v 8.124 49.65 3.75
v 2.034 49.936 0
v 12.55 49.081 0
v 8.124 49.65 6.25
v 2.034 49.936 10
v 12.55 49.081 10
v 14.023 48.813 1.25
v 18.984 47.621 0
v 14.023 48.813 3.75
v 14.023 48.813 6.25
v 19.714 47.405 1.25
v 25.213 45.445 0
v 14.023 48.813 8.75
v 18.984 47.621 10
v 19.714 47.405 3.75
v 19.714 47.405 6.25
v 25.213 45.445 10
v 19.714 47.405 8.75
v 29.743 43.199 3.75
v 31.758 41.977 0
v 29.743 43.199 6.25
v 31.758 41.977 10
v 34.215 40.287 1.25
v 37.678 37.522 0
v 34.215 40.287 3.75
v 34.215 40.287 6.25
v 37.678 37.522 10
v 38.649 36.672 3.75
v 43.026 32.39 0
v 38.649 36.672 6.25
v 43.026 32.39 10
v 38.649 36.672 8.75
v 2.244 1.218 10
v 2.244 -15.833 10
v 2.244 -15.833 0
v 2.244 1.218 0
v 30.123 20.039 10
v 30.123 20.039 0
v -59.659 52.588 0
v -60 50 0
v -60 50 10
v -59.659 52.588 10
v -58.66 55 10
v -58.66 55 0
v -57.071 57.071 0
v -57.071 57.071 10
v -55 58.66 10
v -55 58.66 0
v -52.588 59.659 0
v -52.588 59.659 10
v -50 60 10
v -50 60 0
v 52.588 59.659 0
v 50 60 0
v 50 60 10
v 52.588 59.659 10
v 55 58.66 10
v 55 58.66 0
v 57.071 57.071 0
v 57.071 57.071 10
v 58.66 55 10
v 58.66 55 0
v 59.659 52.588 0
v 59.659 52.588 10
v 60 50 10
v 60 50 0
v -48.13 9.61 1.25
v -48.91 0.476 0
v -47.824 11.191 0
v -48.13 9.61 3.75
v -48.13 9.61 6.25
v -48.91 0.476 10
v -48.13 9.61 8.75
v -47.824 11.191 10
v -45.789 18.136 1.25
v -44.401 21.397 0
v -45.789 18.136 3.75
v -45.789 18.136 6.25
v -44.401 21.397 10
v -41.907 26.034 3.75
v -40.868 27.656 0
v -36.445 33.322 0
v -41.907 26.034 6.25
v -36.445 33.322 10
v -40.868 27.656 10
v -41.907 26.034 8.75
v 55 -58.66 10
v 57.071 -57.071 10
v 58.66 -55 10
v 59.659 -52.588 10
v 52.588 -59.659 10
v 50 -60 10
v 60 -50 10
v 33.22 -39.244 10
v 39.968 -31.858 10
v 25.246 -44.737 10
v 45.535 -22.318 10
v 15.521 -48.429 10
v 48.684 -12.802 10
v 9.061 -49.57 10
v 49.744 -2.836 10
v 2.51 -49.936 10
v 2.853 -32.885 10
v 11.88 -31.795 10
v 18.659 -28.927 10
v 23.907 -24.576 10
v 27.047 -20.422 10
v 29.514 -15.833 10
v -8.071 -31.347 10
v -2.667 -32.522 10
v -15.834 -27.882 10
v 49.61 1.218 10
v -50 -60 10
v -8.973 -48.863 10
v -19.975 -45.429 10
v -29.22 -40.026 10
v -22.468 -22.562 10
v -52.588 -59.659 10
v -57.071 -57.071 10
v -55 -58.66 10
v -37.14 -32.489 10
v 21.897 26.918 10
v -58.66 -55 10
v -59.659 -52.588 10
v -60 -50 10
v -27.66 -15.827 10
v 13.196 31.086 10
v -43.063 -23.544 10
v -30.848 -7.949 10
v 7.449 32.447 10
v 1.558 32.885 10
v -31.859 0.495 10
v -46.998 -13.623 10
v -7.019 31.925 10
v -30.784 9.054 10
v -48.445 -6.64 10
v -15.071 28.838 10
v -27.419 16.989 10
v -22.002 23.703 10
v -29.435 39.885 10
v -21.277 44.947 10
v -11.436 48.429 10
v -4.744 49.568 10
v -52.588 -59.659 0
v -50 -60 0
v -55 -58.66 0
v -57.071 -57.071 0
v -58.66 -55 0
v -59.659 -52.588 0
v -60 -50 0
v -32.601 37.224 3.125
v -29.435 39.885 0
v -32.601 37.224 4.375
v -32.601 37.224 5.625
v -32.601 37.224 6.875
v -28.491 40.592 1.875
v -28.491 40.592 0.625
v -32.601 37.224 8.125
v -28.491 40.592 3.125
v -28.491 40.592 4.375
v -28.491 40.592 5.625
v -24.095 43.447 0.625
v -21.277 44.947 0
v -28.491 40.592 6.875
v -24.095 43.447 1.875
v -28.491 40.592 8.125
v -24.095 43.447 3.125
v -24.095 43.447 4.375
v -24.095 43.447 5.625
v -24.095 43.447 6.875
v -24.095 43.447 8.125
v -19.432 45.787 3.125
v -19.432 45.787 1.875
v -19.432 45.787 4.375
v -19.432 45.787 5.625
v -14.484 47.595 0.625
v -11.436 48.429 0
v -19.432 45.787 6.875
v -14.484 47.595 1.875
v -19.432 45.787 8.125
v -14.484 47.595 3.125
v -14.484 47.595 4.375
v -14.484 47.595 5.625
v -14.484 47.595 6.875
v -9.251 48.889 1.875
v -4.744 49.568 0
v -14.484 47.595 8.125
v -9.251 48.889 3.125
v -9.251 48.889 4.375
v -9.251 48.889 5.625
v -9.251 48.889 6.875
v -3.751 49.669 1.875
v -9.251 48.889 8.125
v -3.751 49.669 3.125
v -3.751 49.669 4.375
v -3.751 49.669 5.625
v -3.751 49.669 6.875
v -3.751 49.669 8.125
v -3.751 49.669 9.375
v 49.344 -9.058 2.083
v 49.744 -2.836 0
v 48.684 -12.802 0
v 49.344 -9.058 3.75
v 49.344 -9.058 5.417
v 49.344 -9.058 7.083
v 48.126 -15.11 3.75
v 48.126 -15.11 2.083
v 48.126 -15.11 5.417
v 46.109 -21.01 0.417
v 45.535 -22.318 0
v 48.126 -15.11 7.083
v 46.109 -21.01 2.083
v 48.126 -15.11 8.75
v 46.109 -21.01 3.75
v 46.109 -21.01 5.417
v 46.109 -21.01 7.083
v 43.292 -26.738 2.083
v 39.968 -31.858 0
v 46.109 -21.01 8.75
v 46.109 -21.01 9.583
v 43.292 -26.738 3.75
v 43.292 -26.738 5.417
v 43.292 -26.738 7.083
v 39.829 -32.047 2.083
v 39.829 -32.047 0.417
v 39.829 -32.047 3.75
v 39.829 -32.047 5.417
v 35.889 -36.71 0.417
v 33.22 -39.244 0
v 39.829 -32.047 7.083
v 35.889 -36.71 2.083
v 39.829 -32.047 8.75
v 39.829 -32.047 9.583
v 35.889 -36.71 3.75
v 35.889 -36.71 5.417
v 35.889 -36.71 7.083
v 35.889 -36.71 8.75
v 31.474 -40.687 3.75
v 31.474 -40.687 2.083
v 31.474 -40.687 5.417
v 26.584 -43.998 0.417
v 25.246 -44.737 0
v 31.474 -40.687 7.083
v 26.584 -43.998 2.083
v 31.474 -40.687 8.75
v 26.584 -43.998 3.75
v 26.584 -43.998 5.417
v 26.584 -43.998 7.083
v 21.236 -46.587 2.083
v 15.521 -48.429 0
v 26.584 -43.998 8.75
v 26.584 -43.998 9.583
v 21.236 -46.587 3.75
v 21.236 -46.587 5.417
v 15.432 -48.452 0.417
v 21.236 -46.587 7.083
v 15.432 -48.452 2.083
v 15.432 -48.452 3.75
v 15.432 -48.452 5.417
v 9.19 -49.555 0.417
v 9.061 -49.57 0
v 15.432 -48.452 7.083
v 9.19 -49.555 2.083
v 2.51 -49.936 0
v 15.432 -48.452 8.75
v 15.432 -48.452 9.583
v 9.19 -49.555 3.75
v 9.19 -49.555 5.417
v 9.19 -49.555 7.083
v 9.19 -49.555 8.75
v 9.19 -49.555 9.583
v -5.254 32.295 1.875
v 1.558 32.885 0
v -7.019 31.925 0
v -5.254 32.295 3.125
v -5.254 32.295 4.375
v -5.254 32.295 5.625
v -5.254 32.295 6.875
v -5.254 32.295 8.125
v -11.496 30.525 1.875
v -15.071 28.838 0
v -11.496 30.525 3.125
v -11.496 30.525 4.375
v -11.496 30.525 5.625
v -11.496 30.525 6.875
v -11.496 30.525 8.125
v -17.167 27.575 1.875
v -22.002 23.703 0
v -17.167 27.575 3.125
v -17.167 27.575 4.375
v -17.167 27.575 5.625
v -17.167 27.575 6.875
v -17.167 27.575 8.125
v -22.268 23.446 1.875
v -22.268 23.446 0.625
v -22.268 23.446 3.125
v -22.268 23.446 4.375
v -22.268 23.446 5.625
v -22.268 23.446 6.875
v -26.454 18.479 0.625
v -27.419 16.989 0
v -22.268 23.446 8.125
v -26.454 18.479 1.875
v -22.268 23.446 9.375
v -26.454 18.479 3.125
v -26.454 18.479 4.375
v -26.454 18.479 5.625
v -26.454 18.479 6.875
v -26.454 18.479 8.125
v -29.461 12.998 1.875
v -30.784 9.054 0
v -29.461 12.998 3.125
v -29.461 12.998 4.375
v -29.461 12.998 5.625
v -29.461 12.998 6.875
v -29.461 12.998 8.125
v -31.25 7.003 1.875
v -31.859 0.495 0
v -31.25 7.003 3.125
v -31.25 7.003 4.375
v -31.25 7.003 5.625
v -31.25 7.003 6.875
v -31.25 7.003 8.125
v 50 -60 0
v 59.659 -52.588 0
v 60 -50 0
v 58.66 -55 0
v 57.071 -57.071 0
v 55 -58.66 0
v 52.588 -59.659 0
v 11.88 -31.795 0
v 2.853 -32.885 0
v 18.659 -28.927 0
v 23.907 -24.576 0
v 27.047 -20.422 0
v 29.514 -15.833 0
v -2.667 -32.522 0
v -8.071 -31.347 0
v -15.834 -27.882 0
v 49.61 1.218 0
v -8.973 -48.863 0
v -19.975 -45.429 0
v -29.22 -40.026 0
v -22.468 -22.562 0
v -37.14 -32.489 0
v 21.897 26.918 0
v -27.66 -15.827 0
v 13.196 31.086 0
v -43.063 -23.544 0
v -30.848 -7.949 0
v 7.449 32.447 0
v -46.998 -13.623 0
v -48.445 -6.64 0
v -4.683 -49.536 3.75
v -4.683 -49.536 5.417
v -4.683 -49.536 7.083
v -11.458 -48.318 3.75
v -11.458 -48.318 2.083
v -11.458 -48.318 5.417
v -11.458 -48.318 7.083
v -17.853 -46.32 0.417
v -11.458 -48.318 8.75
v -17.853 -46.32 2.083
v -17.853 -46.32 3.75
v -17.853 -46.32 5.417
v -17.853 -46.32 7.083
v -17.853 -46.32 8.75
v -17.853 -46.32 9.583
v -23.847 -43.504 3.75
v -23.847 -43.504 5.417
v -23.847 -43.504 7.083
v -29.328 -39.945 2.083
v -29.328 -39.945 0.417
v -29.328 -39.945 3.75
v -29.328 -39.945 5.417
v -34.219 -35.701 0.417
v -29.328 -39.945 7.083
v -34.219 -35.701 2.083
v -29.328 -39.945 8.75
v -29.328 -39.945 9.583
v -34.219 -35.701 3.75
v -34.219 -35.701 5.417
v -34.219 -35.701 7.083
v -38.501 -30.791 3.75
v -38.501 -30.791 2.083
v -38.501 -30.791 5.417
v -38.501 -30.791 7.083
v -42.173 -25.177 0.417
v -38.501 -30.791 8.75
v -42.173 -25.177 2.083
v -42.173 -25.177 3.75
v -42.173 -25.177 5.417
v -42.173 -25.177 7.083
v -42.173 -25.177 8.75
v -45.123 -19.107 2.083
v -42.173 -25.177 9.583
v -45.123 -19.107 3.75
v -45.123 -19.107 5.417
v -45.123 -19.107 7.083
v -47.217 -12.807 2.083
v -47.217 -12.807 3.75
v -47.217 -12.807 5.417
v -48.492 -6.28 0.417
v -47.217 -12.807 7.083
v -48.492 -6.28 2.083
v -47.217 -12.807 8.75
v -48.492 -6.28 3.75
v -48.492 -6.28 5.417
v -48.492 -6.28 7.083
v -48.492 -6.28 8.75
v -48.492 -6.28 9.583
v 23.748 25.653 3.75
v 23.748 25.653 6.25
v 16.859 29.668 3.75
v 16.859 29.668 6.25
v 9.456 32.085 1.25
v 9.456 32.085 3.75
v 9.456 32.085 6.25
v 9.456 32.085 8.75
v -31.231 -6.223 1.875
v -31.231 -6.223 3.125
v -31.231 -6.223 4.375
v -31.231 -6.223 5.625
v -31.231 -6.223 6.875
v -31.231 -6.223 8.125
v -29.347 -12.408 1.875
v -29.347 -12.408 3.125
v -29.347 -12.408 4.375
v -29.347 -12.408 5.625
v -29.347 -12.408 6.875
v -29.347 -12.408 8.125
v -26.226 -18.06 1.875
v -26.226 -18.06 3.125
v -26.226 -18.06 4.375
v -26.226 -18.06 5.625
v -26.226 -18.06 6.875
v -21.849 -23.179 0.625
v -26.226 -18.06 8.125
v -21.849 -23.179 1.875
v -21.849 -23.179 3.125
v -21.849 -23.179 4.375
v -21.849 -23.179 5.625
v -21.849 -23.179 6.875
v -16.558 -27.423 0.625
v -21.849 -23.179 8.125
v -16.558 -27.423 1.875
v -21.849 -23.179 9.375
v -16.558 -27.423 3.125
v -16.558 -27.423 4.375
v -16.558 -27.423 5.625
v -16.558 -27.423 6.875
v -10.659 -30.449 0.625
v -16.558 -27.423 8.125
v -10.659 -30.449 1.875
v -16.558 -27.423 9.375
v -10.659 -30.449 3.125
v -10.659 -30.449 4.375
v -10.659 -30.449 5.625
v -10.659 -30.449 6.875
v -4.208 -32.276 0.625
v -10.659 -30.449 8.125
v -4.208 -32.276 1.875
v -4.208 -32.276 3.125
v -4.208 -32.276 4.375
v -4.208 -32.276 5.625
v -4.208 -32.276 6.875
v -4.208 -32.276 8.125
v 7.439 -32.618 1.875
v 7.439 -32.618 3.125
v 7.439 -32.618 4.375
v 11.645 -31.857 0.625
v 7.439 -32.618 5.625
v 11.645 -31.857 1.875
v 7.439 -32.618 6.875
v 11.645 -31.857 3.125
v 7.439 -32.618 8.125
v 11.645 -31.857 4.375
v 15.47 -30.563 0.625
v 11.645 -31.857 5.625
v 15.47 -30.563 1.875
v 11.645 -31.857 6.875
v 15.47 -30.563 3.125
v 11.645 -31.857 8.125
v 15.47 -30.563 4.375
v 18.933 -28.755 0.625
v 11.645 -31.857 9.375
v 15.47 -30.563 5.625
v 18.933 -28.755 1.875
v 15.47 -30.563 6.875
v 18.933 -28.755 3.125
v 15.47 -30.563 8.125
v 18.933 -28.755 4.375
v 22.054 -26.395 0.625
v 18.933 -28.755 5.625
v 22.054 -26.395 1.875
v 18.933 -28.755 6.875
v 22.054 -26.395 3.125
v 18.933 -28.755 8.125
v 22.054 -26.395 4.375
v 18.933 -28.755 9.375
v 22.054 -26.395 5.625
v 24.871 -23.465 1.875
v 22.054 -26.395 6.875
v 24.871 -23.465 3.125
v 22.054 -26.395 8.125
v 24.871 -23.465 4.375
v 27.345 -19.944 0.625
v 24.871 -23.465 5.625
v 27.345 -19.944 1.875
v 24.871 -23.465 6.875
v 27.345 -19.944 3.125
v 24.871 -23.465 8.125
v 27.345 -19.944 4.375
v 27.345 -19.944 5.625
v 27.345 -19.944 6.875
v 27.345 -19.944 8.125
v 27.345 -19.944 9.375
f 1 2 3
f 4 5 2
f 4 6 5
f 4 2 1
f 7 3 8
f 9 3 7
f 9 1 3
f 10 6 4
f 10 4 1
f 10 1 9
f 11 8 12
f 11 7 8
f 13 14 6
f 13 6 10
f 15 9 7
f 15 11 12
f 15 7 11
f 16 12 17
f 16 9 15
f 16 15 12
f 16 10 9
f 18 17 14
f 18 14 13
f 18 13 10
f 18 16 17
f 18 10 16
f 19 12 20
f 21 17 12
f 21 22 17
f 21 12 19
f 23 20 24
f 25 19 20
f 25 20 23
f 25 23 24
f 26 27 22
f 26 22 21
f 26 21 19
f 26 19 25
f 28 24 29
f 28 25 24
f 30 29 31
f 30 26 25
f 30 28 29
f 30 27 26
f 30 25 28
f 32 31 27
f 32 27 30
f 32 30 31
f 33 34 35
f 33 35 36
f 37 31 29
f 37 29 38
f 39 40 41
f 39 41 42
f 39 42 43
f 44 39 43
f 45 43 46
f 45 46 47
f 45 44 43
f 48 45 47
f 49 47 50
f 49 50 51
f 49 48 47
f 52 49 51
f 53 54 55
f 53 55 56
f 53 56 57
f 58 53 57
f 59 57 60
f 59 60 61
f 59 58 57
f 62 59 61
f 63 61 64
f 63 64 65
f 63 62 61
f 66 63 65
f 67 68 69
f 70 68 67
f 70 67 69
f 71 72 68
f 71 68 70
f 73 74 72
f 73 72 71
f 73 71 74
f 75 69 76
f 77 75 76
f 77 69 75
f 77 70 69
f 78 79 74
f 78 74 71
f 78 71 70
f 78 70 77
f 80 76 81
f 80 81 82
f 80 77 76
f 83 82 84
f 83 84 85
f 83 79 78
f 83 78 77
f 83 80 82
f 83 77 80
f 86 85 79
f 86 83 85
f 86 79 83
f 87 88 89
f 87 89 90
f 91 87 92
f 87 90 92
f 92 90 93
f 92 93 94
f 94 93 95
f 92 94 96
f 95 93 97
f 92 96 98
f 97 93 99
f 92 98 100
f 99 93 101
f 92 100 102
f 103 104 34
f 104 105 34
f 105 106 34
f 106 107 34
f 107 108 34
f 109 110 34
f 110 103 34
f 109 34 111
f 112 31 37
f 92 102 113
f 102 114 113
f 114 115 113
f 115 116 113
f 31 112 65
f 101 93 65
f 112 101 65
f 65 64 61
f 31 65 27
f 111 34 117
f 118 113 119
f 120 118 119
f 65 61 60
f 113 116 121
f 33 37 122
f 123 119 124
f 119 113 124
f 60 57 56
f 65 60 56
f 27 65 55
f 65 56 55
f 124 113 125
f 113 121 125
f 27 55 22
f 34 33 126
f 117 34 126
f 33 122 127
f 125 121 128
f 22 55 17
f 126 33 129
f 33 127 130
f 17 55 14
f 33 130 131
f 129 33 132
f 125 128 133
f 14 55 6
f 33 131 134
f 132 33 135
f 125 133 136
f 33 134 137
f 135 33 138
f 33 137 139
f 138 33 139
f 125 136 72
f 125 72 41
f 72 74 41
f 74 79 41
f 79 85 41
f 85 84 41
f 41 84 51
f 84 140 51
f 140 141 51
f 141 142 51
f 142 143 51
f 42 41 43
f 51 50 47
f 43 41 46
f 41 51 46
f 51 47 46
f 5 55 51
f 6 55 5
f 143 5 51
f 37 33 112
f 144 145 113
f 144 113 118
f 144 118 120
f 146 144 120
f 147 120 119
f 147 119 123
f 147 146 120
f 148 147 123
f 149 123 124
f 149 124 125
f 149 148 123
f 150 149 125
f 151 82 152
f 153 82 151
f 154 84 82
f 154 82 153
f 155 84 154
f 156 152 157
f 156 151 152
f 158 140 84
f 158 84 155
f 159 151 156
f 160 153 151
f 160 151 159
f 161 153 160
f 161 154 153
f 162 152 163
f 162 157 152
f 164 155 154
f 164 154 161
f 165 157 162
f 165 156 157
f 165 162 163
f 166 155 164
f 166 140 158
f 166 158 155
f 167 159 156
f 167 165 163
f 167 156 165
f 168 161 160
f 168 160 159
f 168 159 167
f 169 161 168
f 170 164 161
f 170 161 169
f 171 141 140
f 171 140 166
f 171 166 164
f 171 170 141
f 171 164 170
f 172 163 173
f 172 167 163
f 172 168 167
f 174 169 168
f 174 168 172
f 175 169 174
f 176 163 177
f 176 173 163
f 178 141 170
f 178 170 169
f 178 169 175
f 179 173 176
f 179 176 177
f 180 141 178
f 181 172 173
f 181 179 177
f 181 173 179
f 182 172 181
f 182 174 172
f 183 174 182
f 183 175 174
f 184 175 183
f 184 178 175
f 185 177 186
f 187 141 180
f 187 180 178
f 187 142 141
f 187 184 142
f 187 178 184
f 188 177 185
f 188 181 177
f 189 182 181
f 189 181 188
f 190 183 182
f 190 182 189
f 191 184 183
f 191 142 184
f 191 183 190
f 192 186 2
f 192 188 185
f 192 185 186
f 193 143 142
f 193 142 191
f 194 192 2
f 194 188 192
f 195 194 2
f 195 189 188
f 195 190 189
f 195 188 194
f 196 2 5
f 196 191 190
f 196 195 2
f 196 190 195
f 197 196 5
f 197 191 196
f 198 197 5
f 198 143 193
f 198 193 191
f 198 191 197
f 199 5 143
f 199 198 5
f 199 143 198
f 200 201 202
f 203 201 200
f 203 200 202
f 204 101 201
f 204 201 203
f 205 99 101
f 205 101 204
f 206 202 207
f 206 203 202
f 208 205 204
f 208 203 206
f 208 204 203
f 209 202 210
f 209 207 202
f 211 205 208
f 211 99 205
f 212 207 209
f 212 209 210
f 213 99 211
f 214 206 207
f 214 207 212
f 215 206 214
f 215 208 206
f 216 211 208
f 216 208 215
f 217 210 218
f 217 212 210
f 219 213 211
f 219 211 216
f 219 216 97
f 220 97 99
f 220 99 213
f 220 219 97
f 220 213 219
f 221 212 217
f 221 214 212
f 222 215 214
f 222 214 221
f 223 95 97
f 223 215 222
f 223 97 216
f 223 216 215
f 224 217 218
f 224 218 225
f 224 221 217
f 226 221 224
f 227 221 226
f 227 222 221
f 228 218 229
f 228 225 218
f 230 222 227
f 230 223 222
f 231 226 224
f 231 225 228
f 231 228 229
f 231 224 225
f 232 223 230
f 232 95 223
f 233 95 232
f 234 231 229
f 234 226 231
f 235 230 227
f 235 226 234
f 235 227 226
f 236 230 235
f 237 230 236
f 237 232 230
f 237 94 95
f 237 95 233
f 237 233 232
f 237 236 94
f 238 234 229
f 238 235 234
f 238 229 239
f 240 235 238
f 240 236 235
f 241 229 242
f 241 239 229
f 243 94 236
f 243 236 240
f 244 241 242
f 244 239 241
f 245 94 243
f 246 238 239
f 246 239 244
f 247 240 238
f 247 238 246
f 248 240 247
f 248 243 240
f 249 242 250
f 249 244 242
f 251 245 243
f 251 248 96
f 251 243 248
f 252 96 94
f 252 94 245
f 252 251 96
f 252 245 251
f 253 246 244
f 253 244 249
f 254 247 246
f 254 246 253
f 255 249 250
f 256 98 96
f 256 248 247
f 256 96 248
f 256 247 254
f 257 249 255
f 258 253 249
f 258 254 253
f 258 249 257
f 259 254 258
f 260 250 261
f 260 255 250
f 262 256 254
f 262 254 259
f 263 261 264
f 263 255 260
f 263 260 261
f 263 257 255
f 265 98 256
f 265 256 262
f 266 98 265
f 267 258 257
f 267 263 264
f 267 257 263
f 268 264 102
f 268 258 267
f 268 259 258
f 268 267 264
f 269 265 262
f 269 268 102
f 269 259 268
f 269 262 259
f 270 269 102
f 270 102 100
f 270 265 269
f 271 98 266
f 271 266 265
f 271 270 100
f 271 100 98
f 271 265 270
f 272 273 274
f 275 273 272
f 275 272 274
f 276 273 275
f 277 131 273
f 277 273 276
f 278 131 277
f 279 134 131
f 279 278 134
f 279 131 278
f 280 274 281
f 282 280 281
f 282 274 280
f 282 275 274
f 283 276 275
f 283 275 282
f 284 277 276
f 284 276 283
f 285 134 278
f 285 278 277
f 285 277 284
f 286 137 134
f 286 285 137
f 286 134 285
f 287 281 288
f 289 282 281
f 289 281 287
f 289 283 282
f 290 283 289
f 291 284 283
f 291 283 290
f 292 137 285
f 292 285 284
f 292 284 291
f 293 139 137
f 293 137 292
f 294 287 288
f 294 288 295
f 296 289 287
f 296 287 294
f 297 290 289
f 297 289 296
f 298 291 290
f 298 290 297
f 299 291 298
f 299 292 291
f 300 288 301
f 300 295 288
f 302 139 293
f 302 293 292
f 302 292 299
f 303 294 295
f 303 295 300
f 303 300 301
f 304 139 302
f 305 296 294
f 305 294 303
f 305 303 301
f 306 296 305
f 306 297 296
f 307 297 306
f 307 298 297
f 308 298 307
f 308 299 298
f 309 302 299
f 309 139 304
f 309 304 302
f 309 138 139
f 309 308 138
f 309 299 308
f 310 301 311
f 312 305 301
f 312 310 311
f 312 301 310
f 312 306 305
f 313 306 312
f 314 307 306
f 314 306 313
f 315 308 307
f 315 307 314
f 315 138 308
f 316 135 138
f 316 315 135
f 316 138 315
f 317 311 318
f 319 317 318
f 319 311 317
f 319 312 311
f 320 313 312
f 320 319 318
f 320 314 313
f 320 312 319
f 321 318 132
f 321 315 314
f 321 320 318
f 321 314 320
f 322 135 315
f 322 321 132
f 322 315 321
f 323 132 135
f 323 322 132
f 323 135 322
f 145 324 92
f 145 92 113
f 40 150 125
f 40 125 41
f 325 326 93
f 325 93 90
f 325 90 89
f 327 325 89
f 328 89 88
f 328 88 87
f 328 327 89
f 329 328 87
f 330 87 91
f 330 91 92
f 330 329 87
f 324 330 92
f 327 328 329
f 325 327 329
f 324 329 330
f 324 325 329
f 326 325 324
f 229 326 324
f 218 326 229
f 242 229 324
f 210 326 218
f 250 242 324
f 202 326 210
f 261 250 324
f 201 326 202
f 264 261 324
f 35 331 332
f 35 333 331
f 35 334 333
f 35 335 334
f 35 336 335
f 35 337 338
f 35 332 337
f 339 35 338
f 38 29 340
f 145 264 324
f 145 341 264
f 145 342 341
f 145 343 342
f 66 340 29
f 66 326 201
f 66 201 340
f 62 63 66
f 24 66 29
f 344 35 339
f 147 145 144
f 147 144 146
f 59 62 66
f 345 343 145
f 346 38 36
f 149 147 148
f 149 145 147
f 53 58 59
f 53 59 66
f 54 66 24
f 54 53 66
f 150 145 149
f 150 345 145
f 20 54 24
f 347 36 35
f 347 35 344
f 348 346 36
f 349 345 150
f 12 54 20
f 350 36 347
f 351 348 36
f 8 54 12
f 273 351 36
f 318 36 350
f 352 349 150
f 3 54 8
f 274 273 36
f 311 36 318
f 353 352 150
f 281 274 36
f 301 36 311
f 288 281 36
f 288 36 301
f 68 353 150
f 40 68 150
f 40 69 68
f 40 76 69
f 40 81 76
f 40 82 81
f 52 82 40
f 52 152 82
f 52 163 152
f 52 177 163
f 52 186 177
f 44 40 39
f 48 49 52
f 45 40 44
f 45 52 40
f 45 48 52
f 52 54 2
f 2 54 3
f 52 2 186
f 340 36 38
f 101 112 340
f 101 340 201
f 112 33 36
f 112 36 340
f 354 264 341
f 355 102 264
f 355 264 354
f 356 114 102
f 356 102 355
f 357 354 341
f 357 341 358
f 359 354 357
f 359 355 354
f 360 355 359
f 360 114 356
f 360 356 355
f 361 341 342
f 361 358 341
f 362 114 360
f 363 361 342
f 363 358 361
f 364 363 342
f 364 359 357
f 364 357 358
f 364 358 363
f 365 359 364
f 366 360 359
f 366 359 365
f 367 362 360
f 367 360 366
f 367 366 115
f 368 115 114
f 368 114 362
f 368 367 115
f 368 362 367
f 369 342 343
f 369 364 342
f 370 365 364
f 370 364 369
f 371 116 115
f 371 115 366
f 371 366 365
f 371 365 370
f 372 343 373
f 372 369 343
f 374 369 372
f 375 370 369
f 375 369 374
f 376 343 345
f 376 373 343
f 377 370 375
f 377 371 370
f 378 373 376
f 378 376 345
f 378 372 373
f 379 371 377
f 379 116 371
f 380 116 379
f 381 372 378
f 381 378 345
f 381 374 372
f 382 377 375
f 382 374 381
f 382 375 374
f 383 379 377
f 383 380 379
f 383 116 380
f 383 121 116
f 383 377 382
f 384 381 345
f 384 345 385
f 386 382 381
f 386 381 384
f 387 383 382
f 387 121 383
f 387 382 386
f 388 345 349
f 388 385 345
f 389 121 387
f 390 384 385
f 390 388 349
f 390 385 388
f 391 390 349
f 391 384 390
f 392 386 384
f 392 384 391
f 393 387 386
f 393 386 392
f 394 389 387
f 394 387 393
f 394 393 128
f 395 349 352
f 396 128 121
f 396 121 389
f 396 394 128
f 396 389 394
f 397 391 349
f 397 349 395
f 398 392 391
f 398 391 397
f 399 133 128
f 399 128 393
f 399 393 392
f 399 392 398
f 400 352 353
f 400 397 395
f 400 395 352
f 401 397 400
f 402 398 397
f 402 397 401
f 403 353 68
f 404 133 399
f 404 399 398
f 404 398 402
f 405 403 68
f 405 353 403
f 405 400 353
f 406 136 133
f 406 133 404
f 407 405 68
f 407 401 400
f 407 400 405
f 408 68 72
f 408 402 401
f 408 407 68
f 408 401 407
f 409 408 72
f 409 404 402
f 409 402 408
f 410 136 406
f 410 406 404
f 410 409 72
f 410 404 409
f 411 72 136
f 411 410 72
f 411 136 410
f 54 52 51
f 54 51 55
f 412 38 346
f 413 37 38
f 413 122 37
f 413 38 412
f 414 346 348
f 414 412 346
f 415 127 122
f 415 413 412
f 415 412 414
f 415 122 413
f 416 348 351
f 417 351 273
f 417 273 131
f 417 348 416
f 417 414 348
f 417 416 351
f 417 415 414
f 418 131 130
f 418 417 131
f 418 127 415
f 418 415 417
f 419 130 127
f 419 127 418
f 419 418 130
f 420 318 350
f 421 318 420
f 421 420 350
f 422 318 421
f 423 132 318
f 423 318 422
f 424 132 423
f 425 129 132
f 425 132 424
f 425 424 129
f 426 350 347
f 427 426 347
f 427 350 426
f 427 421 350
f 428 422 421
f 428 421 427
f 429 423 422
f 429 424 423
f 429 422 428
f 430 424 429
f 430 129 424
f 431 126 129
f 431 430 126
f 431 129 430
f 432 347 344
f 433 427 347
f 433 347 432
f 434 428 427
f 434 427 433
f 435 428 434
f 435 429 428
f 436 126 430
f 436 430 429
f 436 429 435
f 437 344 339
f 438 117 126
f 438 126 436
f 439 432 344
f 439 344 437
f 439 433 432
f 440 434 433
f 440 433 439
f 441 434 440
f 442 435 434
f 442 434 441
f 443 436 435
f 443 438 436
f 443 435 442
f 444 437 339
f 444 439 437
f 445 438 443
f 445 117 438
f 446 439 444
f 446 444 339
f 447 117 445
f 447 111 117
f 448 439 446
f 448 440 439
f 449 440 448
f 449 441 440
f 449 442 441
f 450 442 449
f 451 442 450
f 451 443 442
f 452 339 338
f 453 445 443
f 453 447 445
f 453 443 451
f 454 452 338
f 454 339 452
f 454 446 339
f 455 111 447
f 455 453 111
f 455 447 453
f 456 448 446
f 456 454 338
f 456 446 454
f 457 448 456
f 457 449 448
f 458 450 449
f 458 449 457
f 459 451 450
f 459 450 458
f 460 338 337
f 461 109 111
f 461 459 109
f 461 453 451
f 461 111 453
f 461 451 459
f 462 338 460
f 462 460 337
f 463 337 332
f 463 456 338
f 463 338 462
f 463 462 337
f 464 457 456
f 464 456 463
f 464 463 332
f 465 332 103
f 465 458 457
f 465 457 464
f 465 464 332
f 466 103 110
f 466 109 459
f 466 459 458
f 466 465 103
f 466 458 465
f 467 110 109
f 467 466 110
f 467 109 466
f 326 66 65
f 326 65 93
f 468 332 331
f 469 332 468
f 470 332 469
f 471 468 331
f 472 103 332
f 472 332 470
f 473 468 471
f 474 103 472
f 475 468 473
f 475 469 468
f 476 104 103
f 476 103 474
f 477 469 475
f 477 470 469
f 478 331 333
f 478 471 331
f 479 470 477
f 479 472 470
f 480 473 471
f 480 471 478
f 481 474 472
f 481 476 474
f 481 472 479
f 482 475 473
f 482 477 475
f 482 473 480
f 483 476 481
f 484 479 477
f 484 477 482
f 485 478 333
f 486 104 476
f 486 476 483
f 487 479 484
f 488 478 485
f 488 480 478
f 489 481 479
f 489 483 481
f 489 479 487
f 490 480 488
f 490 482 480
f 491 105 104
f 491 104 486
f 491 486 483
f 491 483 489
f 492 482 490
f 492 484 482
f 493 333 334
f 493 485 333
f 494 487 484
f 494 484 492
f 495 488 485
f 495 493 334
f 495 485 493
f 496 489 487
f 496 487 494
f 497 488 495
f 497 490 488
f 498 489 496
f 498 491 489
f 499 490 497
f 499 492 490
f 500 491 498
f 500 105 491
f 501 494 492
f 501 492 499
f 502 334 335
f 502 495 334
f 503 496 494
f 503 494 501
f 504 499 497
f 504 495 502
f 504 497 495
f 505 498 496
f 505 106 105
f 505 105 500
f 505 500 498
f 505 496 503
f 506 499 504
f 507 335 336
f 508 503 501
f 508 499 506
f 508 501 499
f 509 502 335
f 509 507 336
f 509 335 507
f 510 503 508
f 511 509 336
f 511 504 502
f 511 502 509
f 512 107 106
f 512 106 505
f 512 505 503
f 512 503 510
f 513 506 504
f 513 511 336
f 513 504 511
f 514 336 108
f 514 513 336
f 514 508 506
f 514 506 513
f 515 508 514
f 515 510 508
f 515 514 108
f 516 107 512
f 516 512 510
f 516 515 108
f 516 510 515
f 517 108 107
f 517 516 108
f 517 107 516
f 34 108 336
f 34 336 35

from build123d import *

# Parameters (mm, degrees)
BOSS_EXTRUDE1_DEPTH = 10
CUT_EXTRUDE20_DEPTH = 10


with BuildPart() as part:
    # Sketch1 → Boss-Extrude1 (new body)
    with BuildSketch(Plane.XY):
        with BuildLine():
            Line((-50, 60), (50, 60))
            ThreePointArc((50, 60), (57.071067812, 57.071067812), (60, 50))
            Line((60, 50), (60, -50))
            ThreePointArc((60, -50), (57.071067812, -57.071067812), (50, -60))
            Line((50, -60), (-50, -60))
            ThreePointArc((-50, -60), (-57.071067812, -57.071067812), (-60, -50))
            Line((-60, -50), (-60, 50))
            ThreePointArc((-60, 50), (-57.071067812, 57.071067812), (-50, 60))
        make_face()
    extrude(amount=BOSS_EXTRUDE1_DEPTH)

    # Sketch2 → Cut-Extrude20 (cut)
    with BuildSketch(Plane.XY.offset(10)):
        with BuildLine():
            Line((43.025841346, 32.389823718), (30.123197115, 20.0390625))
            add(Edge.make_bspline(
                [(30.123197115, 20.0390625), (29.101672257, 21.061811325), (27.097271839, 23.068613369), (23.819325693, 25.680604146), (20.424368315, 27.901312672), (16.901225536, 29.727334557), (13.244989599, 31.143755892), (9.462875821, 32.156967391), (5.548731191, 32.7579203), (2.899029992, 32.842051661), (1.55849359, 32.884615385)],
                knots=[0, 0, 0, 0, 1.075575784, 2.110457258, 3.113929901, 4.09197124, 5.059417775, 6.02750972, 7.002078037, 8, 8, 8, 8], degree=3))
            add(Edge.make_bspline(
                [(1.55849359, 32.884615385), (0.396289515, 32.854791176), (-1.885800065, 32.796228727), (-5.239110912, 32.351509499), (-8.443404835, 31.608626028), (-11.513820243, 30.579485021), (-14.431611188, 29.240247299), (-17.213683889, 27.611582431), (-19.842917451, 25.681030991), (-22.298608552, 23.485189523), (-24.534523201, 21.087773984), (-26.486594752, 18.521691616), (-28.149340344, 15.834772023), (-29.518119077, 13.01326852), (-30.559610844, 10.06151156), (-31.303099679, 6.981643968), (-31.775030209, 3.782616261), (-31.830751107, 1.600206429), (-31.858974359, 0.494791667)],
                knots=[0, 0, 0, 0, 1.075001177, 2.110859044, 3.123021556, 4.114053297, 5.101481495, 6.087880186, 7.091499647, 8.114004866, 9.131394192, 10.11971144, 11.092043119, 12.050101265, 13.015322563, 13.981809771, 14.977764287, 16, 16, 16, 16], degree=3))
            add(Edge.make_bspline(
                [(-31.858974359, 0.494791667), (-31.83264906, -0.648882984), (-31.780784616, -2.90207861), (-31.282567998, -6.208740054), (-30.514979525, -9.389986642), (-29.39143466, -12.422214259), (-28.0086912, -15.346960195), (-26.255144671, -18.107569332), (-24.210333942, -20.746199204), (-21.877912803, -23.216909745), (-19.340840935, -25.494310256), (-16.593109559, -27.458854559), (-13.718321506, -29.153832231), (-10.670077564, -30.496199757), (-7.501286227, -31.573973822), (-4.179806851, -32.333897032), (-0.713118606, -32.800107284), (1.652171532, -32.856165602), (2.852564103, -32.884615385)],
                knots=[0, 0, 0, 0, 1.022067601, 2.013613092, 2.983553406, 3.943623673, 4.90013463, 5.87121881, 6.861774014, 7.881098904, 8.905697761, 9.905387765, 10.89678721, 11.884561068, 12.87834324, 13.885584958, 14.926927371, 16, 16, 16, 16], degree=3))
            add(Edge.make_bspline(
                [(2.852564103, -32.884615385), (3.633375016, -32.877570263), (5.166280575, -32.863739121), (7.414791803, -32.639220794), (9.56832549, -32.318245747), (11.635221676, -31.893312898), (13.594610257, -31.291956666), (15.47362031, -30.588744605), (17.261242491, -29.758814157), (18.947784497, -28.773531178), (20.558346969, -27.669149395), (22.077854726, -26.405501787), (23.532961722, -25.011078956), (24.906665222, -23.468846061), (26.175714886, -21.765013702), (27.380767856, -19.930892086), (28.508026478, -17.948278664), (29.174093857, -16.548257493), (29.514222756, -15.833333333)],
                knots=[0, 0, 0, 0, 1.109579412, 2.178351274, 3.208885622, 4.204702371, 5.174744997, 6.119429583, 7.05542196, 7.97267548, 8.893247984, 9.828544973, 10.778894627, 11.756245826, 12.760884819, 13.796418446, 14.874735809, 16, 16, 16, 16], degree=3))
            Line((29.514222756, -15.833333333), (2.243589744, -15.833333333))
            Line((2.243589744, -15.833333333), (2.243589744, 1.217948718))
            Line((2.243589744, 1.217948718), (49.610376603, 1.217948718))
            Line((49.610376603, 1.217948718), (49.743589744, -2.835536859))
            add(Edge.make_bspline(
                [(49.743589744, -2.835536859), (49.726472847, -3.876574804), (49.692269599, -5.95679287), (49.379687785, -9.05388319), (48.861900774, -12.109897034), (48.154036366, -15.12176501), (47.266903196, -18.104261414), (46.135530703, -21.028826361), (44.810700427, -23.915293277), (43.326322097, -26.751396909), (41.658307942, -29.472715457), (39.862445782, -32.049444886), (37.964336859, -34.477125435), (35.922698088, -36.721933428), (33.769321141, -38.80272625), (31.499967076, -40.711498835), (29.106609302, -42.449866244), (26.601926388, -44.03251371), (23.971651757, -45.419610834), (21.230246649, -46.626201315), (18.381850215, -47.650933134), (15.419108562, -48.490990308), (12.347851627, -49.139161247), (9.168013616, -49.583612912), (5.877848125, -49.885622812), (3.646198469, -49.91893663), (2.510016026, -49.935897436)],
                knots=[0, 0, 0, 0, 1.006889344, 2.011981806, 3.007738725, 4.003571281, 5.003404394, 6.015442001, 7.03424805, 8.074616296, 9.110249922, 10.119753985, 11.111721717, 12.089233633, 13.052717867, 14.006597561, 14.955430184, 15.912305663, 16.870361111, 17.829300583, 18.807640451, 19.796414044, 20.806216501, 21.841577364, 22.90109906, 24, 24, 24, 24], degree=3))
            add(Edge.make_bspline(
                [(2.510016026, -49.935897436), (1.297786391, -49.919148326), (-1.105214309, -49.885946594), (-4.658372904, -49.574989776), (-8.108452155, -49.061775621), (-11.456312597, -48.351504768), (-14.709727285, -47.467515954), (-17.863106347, -46.357900887), (-20.910000278, -45.037978679), (-23.85953309, -43.54270137), (-26.674006547, -41.846926658), (-29.347112957, -39.980390143), (-31.864262001, -37.931085264), (-34.251237083, -35.733317811), (-36.452269248, -33.333066461), (-38.549382353, -30.808135004), (-40.44097845, -28.065919025), (-42.208390563, -25.195321967), (-43.778573599, -22.19754677), (-45.151721242, -19.128038823), (-46.322740771, -16.004570602), (-47.246117975, -12.812598182), (-47.995813786, -9.574378679), (-48.532235209, -6.275829811), (-48.83517745, -2.917364496), (-48.885118988, -0.660301834), (-48.91025641, 0.475761218)],
                knots=[0, 0, 0, 0, 1.084149091, 2.14910686, 3.187506334, 4.202448172, 5.208724393, 6.201130722, 7.189831603, 8.176984443, 9.156919086, 10.126598231, 11.090766514, 12.05840148, 13.026036446, 14.001772938, 14.991905635, 16.003017641, 17.015720547, 18.016462227, 19.009322657, 19.99686681, 20.986544154, 21.980959929, 22.983742515, 24, 24, 24, 24], degree=3))
            add(Edge.make_bspline(
                [(-48.91025641, 0.475761218), (-48.876592035, 2.025593992), (-48.810114873, 5.086054225), (-48.194435478, 9.594131562), (-47.234683024, 13.955246578), (-45.857341624, 18.15351638), (-44.089887361, 22.194724133), (-41.957357822, 26.088356769), (-39.413429836, 29.830275694), (-37.444254854, 32.14704321), (-36.4453125, 33.322315705)],
                knots=[0, 0, 0, 0, 1.034044851, 2.041932006, 3.031217818, 4.011390712, 4.986069675, 5.97149666, 6.970960976, 8, 8, 8, 8], degree=3))
            add(Edge.make_bspline(
                [(-36.4453125, 33.322315705), (-35.825078952, 34.002246466), (-34.593924689, 35.351898801), (-32.625926838, 37.227268178), (-30.608020011, 38.990184776), (-28.512255874, 40.603267051), (-26.349651476, 42.101826149), (-24.113982457, 43.457770387), (-21.816976621, 44.714273743), (-19.440720102, 45.807174398), (-16.997652934, 46.787051002), (-14.476955156, 47.616164385), (-11.897506276, 48.350561775), (-9.236465188, 48.909249832), (-6.520714756, 49.374482609), (-3.730977675, 49.686305981), (-0.874856146, 49.914850314), (1.056880807, 49.928826235), (2.034254808, 49.935897436)],
                knots=[0, 0, 0, 0, 1.020590567, 2.025856924, 3.013483481, 3.991664875, 4.957826714, 5.930500614, 6.890802512, 7.860442893, 8.829981142, 9.809047939, 10.802672283, 11.803273349, 12.823572789, 13.857849586, 14.916166035, 16, 16, 16, 16], degree=3))
            add(Edge.make_bspline(
                [(2.034254808, 49.935897436), (3.055927959, 49.920141479), (5.088682381, 49.888792909), (8.111051578, 49.671881266), (11.091422928, 49.337237729), (14.017236856, 48.835253312), (16.898312407, 48.216202044), (19.719736444, 47.423044151), (22.499915266, 46.521873915), (24.309801151, 45.803394427), (25.213341346, 45.444711538)],
                knots=[0, 0, 0, 0, 1.03180557, 2.052914215, 3.058998889, 4.059601663, 5.049854447, 6.033765722, 7.018406786, 8, 8, 8, 8], degree=3))
            add(Edge.make_bspline(
                [(25.213341346, 45.444711538), (25.973558652, 45.113223986), (27.519819621, 44.438987476), (29.769438752, 43.205440158), (32.024554321, 41.837911379), (34.260832481, 40.286401114), (36.474865772, 38.553811407), (38.689771056, 36.667508217), (40.882937788, 34.60549617), (42.302289454, 33.137946044), (43.025841346, 32.389823718)],
                knots=[0, 0, 0, 0, 0.894392155, 1.819168899, 2.76525314, 3.739198753, 4.75366411, 5.797420238, 6.877176959, 8, 8, 8, 8], degree=3))
        make_face()
    extrude(amount=-CUT_EXTRUDE20_DEPTH, mode=Mode.SUBTRACT)


solid = part.part
